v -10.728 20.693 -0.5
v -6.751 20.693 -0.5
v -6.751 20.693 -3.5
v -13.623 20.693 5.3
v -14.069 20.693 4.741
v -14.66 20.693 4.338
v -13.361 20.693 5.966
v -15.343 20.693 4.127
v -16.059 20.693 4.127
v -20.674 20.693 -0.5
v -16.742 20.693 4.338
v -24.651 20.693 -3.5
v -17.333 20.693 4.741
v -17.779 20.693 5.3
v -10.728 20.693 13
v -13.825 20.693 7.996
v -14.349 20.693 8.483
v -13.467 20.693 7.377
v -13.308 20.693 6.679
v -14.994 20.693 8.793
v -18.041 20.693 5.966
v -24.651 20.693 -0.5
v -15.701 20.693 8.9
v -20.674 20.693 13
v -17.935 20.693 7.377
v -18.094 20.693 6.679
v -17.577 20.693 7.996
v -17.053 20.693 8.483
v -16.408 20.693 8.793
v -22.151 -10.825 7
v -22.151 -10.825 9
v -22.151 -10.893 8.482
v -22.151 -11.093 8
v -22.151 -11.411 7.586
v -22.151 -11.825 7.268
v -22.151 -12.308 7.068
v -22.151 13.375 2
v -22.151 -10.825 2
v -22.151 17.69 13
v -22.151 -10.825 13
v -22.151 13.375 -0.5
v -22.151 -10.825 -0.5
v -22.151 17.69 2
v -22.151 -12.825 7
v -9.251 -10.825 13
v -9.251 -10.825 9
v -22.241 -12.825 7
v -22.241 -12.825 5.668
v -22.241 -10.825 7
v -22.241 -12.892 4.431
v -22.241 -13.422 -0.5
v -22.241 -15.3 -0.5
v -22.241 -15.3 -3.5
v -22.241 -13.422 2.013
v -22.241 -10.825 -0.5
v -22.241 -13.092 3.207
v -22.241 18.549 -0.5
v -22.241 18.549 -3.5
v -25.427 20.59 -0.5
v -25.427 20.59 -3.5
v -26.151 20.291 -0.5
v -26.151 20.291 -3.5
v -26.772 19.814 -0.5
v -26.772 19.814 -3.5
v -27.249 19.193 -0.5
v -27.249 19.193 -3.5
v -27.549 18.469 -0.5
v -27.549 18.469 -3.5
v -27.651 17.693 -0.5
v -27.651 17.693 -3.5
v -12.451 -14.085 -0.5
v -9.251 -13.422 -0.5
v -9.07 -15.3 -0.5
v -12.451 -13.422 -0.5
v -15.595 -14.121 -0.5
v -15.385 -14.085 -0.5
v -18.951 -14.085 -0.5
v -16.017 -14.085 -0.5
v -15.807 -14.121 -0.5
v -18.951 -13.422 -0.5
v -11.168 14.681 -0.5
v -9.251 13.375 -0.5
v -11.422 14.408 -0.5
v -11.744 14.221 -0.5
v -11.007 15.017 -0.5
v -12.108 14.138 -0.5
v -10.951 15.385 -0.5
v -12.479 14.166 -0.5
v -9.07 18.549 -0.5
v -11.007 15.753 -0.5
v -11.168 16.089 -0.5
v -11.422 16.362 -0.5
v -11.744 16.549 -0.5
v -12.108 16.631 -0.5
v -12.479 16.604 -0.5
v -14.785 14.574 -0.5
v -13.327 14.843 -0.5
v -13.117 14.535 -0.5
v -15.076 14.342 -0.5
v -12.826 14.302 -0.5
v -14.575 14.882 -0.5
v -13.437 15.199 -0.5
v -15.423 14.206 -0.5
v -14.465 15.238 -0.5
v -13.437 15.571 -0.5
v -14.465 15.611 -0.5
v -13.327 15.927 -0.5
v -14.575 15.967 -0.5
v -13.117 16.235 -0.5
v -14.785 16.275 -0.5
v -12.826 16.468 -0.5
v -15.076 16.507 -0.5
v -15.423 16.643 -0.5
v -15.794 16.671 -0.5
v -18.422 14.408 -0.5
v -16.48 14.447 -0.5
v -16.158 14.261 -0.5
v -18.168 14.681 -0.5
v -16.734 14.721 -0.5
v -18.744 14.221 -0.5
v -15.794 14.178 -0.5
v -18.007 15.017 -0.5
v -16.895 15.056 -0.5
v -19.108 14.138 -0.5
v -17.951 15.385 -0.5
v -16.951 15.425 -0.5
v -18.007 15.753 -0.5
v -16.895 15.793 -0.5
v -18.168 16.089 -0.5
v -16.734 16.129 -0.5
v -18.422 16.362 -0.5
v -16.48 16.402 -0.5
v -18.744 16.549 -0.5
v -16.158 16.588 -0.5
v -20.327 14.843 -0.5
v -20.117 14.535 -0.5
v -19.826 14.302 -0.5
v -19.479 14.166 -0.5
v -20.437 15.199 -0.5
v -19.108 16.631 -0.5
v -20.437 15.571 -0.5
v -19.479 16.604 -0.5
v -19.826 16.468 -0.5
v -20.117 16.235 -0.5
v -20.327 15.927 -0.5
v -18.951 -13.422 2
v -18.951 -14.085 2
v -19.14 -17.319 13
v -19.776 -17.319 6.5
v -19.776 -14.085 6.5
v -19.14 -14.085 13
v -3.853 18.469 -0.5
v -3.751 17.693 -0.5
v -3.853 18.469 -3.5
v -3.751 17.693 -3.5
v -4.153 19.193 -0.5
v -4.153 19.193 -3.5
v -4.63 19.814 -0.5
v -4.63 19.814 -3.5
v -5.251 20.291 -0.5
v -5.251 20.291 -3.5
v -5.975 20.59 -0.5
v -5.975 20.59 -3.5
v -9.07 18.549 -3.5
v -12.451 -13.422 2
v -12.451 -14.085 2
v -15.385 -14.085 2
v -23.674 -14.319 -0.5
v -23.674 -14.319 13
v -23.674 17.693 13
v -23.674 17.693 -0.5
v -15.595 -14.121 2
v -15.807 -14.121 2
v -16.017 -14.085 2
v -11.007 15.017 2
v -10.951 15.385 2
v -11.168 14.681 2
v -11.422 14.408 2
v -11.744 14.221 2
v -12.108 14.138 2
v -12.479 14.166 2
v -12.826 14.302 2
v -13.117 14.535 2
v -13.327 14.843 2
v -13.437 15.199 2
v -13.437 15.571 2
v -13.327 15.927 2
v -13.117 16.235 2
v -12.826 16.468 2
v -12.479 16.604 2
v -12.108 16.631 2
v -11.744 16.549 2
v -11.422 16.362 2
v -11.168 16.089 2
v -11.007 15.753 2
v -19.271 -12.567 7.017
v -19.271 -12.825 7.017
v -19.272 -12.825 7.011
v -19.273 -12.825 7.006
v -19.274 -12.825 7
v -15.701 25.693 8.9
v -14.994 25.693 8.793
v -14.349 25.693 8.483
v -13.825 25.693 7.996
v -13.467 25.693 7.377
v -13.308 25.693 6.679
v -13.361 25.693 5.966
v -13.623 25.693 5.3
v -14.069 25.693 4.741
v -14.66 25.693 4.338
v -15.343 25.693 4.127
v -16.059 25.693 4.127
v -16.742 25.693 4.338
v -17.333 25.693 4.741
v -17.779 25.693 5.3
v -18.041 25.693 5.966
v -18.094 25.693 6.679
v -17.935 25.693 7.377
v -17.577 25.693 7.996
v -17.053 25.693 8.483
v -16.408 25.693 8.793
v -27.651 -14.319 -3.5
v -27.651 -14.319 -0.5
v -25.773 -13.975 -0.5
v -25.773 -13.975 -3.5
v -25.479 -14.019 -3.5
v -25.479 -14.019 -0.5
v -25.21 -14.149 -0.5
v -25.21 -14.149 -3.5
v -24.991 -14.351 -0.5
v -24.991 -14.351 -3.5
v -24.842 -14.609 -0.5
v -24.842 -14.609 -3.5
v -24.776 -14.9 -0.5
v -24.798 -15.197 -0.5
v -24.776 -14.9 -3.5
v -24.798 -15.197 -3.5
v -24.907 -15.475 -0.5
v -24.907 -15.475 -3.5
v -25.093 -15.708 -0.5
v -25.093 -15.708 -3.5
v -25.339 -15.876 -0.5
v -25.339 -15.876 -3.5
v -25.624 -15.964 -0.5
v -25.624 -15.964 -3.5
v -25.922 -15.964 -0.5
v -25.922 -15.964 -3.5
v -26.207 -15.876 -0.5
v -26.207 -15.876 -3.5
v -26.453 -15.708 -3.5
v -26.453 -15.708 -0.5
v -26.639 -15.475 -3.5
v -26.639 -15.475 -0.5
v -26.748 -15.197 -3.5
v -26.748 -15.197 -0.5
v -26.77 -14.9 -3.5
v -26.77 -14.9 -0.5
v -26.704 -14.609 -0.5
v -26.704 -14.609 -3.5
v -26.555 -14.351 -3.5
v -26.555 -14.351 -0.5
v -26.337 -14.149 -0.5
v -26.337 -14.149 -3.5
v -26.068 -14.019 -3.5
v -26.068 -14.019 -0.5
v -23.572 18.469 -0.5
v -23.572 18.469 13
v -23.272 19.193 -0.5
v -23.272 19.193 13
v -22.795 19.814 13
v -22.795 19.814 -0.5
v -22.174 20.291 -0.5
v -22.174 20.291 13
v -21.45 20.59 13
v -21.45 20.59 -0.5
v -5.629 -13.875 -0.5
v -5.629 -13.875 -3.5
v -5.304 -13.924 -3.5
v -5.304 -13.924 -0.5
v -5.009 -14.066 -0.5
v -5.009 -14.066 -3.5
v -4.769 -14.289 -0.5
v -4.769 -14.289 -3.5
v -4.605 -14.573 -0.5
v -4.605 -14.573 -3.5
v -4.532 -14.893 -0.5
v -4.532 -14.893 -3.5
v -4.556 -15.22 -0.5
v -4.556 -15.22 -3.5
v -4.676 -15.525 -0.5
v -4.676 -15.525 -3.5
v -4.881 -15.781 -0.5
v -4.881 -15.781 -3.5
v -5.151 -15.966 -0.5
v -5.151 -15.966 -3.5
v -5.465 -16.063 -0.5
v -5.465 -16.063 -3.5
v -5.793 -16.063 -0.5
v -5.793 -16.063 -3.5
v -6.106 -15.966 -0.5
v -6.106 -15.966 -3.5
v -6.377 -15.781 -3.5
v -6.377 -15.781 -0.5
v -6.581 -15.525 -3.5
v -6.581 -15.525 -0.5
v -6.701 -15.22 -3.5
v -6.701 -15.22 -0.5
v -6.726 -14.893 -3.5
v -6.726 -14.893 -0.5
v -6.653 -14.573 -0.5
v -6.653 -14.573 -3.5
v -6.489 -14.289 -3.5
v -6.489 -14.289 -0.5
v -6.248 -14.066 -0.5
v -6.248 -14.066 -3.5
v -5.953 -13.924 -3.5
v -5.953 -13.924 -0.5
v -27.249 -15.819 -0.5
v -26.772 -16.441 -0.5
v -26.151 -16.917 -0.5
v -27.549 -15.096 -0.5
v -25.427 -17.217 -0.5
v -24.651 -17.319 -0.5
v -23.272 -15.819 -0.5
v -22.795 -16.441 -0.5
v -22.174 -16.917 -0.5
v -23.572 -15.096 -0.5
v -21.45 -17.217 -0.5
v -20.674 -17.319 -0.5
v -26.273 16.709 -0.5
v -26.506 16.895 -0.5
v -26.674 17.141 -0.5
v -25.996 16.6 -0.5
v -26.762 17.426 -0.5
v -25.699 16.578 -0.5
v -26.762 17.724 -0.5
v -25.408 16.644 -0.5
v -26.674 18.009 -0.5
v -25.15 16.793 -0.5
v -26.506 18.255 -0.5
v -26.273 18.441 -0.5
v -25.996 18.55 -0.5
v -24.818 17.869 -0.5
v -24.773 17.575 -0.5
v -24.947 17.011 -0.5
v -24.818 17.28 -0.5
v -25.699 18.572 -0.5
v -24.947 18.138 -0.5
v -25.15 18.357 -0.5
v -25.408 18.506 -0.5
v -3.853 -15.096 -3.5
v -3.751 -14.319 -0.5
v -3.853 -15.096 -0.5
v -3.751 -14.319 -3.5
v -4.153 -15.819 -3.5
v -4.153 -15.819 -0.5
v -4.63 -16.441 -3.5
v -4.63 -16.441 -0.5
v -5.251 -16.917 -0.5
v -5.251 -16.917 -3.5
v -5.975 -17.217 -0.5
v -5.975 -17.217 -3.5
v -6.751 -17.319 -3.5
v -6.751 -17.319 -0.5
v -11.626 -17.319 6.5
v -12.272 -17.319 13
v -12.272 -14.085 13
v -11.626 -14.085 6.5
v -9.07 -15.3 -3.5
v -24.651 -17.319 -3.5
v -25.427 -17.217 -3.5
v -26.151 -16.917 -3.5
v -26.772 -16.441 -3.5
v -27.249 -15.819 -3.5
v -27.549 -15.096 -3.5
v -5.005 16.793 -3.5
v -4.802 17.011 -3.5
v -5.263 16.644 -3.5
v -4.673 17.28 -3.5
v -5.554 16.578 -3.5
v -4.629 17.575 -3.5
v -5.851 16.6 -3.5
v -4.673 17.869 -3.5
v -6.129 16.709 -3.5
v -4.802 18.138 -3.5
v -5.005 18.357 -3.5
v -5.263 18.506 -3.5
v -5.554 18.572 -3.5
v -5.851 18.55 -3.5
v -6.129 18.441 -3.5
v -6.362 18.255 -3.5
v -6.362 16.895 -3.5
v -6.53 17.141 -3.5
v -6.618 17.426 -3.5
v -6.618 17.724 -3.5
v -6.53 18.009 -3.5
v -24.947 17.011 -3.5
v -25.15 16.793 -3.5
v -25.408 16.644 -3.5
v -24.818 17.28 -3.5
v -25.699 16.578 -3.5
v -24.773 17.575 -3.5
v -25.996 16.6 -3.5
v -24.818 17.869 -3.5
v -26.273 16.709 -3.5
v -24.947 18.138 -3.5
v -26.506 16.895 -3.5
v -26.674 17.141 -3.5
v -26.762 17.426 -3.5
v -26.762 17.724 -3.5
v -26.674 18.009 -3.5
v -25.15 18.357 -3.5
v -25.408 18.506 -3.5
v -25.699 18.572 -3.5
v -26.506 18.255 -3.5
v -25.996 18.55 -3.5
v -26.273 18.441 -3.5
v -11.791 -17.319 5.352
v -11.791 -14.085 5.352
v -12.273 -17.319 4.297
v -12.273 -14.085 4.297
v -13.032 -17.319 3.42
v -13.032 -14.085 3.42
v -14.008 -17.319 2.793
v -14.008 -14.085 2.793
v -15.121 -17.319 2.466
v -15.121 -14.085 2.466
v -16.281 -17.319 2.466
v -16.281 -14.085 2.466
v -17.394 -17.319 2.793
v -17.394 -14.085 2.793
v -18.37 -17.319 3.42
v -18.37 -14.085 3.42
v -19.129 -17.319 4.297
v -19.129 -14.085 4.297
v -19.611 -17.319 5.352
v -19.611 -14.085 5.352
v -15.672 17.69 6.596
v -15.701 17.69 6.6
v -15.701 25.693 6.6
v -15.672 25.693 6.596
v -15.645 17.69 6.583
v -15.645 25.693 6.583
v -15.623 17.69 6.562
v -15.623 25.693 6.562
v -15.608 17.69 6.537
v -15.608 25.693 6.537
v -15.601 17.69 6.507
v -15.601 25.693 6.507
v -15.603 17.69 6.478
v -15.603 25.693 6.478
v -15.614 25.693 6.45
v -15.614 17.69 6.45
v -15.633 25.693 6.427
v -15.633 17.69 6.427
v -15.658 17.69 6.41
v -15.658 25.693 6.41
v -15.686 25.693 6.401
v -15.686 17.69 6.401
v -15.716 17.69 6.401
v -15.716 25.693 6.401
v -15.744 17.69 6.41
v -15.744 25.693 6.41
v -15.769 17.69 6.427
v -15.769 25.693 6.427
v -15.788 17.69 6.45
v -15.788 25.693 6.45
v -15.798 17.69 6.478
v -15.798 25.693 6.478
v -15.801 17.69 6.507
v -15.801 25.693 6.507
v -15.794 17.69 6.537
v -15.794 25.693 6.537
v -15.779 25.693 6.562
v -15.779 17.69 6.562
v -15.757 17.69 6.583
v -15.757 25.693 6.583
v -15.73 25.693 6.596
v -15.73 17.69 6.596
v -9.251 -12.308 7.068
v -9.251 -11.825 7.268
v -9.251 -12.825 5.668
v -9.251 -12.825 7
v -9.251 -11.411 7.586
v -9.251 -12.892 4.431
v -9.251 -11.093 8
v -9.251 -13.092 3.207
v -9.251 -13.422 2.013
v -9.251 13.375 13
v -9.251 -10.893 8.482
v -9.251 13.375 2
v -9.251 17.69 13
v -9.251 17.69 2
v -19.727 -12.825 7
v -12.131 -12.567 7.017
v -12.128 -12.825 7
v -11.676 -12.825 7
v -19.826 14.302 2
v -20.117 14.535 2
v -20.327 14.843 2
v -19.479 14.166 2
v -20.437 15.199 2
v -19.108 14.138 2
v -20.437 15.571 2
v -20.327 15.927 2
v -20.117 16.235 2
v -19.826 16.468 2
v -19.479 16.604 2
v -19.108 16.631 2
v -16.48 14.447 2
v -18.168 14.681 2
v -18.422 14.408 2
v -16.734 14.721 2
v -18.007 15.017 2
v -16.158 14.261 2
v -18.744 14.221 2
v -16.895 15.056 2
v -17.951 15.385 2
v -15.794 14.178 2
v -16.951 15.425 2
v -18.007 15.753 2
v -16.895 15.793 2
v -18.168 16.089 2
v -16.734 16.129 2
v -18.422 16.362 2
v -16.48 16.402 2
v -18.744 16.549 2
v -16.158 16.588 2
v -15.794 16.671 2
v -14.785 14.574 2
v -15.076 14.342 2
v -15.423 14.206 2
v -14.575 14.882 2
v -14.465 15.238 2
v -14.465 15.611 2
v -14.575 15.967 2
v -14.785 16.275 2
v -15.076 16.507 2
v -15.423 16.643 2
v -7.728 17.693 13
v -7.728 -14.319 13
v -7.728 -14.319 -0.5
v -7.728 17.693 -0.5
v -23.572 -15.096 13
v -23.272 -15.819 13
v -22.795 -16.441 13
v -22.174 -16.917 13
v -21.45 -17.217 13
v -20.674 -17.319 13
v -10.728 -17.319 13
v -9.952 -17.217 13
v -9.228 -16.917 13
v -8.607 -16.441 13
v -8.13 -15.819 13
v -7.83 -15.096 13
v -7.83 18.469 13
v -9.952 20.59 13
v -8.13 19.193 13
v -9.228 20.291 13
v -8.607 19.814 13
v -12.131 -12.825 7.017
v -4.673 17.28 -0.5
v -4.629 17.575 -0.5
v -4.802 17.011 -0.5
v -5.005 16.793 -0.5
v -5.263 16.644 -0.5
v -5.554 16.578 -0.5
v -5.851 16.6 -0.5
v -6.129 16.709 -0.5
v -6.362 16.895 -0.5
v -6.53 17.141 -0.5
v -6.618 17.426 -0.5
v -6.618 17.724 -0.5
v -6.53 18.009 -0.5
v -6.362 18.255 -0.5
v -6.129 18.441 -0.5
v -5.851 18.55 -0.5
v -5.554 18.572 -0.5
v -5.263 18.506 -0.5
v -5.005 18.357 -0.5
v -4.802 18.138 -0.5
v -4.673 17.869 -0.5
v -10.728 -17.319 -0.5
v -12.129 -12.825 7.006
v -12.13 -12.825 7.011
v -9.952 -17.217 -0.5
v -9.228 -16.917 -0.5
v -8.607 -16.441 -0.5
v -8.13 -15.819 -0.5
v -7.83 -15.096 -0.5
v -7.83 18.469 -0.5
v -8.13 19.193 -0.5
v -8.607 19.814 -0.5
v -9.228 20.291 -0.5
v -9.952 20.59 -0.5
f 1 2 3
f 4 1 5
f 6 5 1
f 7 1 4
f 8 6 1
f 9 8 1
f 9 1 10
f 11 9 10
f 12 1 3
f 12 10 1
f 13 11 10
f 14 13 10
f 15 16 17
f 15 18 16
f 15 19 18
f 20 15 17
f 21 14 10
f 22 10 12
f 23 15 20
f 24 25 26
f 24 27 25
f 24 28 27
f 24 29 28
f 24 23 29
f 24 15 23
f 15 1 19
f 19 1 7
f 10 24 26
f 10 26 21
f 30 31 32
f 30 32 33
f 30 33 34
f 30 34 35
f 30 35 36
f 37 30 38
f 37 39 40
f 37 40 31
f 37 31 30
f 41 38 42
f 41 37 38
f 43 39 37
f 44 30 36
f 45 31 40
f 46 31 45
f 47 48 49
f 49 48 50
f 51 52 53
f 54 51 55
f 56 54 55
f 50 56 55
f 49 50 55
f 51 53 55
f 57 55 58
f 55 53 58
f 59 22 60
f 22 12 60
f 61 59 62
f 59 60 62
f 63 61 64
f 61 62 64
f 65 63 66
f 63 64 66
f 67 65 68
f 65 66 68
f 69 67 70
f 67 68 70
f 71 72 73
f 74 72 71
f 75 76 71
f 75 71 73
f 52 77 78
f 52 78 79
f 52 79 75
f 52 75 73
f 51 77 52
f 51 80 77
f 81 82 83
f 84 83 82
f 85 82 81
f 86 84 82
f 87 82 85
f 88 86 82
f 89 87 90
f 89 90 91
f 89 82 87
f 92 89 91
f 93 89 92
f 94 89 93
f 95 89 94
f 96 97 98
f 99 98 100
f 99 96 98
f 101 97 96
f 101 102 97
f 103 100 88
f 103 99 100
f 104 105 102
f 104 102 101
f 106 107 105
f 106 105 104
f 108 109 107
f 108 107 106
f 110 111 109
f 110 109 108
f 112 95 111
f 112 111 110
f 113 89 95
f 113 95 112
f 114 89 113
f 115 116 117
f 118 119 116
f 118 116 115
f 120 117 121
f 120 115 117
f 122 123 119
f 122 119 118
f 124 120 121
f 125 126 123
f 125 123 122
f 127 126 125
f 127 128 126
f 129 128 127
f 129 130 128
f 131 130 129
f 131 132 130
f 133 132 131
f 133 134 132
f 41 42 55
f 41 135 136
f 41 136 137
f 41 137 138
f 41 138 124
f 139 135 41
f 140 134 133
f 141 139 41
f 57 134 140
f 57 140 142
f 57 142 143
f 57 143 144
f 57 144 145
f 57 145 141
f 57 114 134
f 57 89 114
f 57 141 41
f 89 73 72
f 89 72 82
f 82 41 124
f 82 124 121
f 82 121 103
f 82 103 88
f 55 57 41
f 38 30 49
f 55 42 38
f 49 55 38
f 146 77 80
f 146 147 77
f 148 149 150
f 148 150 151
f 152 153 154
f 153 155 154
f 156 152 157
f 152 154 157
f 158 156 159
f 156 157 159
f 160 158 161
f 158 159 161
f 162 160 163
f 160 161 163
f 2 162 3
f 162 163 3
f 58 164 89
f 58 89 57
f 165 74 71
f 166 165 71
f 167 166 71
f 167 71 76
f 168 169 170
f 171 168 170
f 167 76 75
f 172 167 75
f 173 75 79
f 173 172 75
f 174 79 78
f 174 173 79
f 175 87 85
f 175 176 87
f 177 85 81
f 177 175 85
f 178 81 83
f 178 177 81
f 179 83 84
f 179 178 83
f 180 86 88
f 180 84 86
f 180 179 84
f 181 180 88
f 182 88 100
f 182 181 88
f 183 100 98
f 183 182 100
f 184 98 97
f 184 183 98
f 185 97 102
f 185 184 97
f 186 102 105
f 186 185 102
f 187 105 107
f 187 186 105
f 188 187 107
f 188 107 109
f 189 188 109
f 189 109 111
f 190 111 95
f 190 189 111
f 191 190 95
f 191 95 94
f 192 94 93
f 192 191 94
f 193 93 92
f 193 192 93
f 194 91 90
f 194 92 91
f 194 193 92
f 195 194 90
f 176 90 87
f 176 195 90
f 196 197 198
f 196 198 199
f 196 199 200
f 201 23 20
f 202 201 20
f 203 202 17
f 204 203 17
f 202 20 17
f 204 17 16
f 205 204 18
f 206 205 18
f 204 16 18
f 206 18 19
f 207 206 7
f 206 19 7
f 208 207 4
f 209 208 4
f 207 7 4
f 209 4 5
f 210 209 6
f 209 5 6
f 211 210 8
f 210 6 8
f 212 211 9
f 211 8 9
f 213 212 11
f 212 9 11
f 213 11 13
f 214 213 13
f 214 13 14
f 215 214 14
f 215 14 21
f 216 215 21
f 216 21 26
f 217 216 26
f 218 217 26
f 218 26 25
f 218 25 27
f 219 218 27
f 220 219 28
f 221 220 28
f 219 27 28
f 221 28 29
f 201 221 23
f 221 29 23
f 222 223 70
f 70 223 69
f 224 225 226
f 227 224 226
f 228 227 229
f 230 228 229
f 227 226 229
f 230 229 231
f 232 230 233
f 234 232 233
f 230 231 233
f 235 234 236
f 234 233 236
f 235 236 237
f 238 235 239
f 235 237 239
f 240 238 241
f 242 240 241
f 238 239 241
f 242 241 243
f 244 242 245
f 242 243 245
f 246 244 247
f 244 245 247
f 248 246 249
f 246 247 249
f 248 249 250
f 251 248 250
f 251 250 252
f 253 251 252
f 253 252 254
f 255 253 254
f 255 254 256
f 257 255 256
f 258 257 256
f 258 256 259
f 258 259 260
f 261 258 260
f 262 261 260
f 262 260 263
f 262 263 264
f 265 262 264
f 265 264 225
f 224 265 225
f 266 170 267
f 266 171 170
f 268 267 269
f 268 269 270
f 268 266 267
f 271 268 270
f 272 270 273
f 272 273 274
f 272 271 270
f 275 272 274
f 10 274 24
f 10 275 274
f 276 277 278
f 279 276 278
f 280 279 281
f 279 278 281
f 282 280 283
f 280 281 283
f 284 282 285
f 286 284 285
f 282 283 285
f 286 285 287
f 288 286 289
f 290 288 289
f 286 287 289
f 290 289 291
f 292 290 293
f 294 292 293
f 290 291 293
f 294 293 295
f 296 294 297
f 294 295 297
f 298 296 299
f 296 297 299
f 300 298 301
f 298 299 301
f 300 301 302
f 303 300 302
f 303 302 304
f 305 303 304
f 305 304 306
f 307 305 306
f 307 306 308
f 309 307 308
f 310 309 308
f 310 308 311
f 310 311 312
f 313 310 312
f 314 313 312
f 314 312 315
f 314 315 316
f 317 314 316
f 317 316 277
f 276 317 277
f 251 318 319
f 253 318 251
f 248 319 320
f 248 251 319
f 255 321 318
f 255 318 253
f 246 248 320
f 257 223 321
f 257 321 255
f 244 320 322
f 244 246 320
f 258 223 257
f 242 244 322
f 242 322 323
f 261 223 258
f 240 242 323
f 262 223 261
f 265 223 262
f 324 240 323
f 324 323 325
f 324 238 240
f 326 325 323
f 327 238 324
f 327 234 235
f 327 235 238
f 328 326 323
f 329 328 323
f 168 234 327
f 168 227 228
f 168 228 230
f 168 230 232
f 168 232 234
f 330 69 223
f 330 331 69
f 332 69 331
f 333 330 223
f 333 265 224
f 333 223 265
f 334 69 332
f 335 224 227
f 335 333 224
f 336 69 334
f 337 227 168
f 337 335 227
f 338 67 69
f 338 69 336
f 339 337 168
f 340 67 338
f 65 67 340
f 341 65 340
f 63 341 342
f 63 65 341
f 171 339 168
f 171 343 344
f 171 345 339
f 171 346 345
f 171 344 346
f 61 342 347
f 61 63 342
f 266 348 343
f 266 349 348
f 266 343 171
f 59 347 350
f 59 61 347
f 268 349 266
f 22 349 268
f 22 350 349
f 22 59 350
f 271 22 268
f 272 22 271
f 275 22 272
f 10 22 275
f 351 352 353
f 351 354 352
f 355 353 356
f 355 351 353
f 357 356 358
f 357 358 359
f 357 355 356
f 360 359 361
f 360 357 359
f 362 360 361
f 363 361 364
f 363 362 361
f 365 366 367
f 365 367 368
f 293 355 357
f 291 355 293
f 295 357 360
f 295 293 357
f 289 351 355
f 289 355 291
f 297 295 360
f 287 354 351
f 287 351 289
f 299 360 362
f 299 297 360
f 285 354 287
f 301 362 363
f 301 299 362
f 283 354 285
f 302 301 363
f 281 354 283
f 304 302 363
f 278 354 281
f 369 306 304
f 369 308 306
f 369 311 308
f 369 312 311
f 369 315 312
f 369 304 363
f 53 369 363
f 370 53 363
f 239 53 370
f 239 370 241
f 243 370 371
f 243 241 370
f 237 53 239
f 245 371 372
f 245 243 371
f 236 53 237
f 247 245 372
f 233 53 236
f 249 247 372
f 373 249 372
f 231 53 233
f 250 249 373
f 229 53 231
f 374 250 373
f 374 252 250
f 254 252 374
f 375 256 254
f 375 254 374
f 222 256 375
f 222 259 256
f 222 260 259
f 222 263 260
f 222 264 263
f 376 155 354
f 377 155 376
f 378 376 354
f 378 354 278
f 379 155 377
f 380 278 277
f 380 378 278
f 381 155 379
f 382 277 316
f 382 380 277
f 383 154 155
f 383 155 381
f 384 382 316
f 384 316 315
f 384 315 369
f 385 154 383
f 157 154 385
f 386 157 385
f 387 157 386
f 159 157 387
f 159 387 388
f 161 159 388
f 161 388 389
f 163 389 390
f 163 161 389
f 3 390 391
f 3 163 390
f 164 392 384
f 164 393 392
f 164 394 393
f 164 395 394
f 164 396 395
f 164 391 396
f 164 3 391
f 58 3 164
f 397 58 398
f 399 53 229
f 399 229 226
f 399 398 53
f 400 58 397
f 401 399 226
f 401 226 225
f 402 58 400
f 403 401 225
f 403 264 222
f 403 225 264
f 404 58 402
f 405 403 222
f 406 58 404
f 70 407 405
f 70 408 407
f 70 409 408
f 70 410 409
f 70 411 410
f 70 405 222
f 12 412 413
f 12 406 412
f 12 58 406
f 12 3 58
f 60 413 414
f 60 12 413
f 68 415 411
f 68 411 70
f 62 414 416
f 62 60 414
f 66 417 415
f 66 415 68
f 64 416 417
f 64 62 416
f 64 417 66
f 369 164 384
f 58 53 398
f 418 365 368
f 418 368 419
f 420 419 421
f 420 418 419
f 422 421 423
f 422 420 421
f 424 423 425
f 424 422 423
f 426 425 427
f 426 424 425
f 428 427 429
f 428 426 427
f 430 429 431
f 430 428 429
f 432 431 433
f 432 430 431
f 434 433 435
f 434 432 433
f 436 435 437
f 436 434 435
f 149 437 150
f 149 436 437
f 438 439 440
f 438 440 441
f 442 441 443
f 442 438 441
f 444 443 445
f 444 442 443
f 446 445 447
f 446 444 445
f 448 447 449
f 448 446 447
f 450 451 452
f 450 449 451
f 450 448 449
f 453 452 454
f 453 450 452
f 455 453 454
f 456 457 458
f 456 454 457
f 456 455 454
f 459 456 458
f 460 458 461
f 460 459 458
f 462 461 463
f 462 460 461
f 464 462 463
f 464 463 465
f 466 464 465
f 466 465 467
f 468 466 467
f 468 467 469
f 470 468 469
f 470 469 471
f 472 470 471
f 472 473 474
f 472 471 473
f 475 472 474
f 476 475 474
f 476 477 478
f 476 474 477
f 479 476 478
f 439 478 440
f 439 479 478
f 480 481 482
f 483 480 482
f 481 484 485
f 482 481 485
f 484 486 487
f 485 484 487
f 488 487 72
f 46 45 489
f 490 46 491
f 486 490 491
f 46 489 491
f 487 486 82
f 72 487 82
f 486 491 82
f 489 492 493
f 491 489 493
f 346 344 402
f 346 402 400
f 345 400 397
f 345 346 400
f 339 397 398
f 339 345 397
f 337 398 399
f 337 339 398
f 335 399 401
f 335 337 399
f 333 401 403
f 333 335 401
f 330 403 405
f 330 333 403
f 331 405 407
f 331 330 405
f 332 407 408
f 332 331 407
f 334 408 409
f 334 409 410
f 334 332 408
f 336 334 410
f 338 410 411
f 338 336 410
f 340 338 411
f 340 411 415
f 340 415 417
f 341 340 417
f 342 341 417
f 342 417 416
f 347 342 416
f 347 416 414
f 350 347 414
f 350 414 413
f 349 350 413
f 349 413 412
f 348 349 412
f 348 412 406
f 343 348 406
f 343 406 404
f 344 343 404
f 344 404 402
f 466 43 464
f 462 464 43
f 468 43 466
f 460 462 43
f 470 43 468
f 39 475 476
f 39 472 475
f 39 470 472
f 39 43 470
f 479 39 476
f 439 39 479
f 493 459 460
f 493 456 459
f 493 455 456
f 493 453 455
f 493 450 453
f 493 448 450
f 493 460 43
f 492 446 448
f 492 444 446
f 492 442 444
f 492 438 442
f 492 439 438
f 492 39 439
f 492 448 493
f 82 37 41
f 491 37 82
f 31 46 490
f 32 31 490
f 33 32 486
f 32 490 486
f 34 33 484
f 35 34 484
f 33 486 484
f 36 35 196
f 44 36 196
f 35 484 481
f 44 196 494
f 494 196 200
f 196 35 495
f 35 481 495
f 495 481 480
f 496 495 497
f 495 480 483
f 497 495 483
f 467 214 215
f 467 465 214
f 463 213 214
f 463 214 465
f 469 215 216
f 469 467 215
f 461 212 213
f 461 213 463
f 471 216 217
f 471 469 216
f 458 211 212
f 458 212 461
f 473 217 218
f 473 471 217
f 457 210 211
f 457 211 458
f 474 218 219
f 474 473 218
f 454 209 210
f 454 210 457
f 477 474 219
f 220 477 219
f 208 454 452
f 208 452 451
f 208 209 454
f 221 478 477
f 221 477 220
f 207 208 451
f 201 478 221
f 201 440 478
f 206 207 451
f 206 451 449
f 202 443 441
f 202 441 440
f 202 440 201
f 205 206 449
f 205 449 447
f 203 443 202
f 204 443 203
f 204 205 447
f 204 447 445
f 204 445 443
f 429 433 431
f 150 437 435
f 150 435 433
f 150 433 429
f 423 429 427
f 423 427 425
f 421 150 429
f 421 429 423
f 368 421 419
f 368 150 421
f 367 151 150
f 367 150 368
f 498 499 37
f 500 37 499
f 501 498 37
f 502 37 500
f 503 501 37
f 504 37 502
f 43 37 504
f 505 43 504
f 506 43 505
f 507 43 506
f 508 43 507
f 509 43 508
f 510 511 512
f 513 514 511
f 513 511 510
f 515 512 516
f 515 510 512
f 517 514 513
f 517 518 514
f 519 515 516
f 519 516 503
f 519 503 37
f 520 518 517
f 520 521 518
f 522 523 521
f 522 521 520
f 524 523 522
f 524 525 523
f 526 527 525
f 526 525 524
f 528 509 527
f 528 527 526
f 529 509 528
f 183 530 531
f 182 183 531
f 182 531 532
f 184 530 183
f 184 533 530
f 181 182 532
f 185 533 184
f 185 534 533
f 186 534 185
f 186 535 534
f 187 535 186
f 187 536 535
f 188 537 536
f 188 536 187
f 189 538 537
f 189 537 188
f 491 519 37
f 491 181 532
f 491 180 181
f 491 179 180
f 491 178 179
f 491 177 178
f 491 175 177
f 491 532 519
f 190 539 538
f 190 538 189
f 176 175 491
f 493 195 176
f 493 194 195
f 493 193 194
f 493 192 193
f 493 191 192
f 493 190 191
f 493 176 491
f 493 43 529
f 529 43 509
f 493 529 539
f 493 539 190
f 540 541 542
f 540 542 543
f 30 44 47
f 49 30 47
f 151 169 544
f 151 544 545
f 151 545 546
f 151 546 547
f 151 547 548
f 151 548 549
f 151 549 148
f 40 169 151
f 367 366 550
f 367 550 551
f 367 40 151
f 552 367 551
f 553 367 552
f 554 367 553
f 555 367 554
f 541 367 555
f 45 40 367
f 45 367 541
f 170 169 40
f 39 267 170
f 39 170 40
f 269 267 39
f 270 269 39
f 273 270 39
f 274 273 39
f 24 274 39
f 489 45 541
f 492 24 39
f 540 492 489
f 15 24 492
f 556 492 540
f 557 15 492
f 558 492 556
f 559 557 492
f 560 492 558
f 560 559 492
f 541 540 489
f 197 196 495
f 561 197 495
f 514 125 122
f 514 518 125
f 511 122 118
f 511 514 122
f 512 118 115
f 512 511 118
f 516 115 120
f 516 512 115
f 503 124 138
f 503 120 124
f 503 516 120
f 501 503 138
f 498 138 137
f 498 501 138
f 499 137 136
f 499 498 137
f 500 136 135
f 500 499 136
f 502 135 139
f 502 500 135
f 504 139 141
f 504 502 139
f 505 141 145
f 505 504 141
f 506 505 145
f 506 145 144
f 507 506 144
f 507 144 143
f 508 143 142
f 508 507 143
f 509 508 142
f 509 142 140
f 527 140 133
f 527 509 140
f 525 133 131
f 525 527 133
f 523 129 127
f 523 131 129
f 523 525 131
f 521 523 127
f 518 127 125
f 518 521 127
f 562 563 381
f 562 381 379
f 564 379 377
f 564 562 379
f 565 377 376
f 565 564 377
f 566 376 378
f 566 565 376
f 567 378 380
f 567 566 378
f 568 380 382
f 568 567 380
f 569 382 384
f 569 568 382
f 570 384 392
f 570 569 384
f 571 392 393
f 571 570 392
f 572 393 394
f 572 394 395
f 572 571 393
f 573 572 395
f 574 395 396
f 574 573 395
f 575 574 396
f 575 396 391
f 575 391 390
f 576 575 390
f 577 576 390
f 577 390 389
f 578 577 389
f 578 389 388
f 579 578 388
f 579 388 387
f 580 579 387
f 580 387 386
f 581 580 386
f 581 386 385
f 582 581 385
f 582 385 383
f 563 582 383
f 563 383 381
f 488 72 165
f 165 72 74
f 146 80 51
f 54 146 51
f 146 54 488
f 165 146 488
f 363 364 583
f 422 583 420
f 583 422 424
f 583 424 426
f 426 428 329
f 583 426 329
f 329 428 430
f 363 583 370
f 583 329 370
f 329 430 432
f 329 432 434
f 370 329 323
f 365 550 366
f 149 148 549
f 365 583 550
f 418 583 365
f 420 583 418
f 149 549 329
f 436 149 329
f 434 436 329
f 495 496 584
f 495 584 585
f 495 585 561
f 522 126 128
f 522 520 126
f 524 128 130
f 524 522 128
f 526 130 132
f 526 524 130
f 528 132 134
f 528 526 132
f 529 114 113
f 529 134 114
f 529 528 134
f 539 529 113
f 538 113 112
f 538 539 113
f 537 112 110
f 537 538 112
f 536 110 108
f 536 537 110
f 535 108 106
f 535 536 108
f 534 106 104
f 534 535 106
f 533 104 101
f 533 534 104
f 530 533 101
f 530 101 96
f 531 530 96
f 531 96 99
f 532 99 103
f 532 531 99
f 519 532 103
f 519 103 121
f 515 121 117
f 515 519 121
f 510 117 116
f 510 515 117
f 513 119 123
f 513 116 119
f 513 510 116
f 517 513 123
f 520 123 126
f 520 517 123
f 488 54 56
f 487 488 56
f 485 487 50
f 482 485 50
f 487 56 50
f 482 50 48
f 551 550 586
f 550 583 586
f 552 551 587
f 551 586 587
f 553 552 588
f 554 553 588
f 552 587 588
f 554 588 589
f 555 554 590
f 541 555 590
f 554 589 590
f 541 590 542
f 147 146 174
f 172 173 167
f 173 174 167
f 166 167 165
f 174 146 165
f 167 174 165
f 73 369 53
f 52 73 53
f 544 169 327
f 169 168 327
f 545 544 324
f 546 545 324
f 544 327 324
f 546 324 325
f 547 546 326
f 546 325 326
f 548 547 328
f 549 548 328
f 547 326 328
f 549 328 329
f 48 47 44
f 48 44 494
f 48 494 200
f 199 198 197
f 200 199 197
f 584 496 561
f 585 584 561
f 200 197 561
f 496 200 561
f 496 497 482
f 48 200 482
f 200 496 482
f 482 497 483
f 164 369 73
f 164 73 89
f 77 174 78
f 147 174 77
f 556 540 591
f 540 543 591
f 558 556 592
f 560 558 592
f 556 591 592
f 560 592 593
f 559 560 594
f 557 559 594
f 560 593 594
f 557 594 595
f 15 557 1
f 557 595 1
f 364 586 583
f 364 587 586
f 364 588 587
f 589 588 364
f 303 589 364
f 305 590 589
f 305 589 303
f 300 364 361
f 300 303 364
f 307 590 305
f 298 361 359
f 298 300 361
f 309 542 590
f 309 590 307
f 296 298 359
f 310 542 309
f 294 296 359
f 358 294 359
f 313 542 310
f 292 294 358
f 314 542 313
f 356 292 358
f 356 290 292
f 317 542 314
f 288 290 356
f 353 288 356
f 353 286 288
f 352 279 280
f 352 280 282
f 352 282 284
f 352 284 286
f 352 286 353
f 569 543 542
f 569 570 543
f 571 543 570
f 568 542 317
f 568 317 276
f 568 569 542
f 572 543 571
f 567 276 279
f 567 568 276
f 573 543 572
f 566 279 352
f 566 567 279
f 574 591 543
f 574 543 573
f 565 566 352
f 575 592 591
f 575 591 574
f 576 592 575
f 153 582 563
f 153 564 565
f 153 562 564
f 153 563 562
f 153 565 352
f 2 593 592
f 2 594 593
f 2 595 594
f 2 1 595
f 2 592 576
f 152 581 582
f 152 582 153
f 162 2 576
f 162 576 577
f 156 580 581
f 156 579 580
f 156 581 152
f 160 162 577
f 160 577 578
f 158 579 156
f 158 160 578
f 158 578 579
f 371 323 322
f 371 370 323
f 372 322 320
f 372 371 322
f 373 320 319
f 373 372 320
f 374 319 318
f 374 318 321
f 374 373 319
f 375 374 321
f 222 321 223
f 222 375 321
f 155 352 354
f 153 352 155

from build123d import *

# Parameters (mm, degrees)
SKETCH_1_W                = 32.6
SKETCH_1_H                = 34.6
SKETCH_1_R                = 1.25
SKETCH_1_W_2              = 24.6
SKETCH_1_H_2              = 24.2
EXTRUDE_1_DEPTH           = 13
SKETCH_3_W                = 6.5
SKETCH_3_H                = 6.519005167
CUT_EXTRUDE_1_DEPTH       = 19
SKETCH_4_W                = 6.5
SKETCH_4_H                = 6.467668889
CUT_EXTRUDE_2_DEPTH       = 23
EXTRUDE_2_DEPTH           = 50
SKETCH_1_2_W              = 22.27659965
SKETCH_1_2_H              = 4.598586669
SKETCH_1_2_W_2            = 22.283050596
SKETCH_1_2_H_2            = 4.977540741
CUT_EXTRUDE_5_DEPTH       = 34
FILLET_1_R                = 2
FILLET_2_R                = 2
SKETCH_9_W                = 54.594998093
SKETCH_9_H                = 18.111982385
SKETCH_9_W_2              = 52.534809486
SKETCH_9_H_2              = 12.989301534
CUT_EXTRUDE_6_DEPTH       = 41
FILLET_6_R                = 22
EXTRUDE_4_DEPTH           = 13
SKETCH_13_W               = 5.518907879
SKETCH_13_H               = 8.361822047
CUT_EXTRUDE_8_DEPTH       = 8.5
SKETCH_14_W               = 6.038657432
SKETCH_14_H               = 7.741248121
CUT_EXTRUDE_9_DEPTH       = 8.5
SKETCH_23_OUTSIDE_W       = 35.102
SKETCH_23_OUTSIDE_H       = 56.702
SKETCH_23_OUTSIDE_W_2     = 1.5
SKETCH_23_OUTSIDE_H_2     = 34.6
CUT_EXTRUDE_10_DEPTH      = 104
SKETCH_24_W               = 10.341780897
SKETCH_24_H               = 5.2
SKETCH_24_R               = 1.25
EXTRUDE_5_DEPTH           = 1.5
SKETCH_25_R               = 1.25
CUT_EXTRUDE_11_DEPTH      = 104
SKETCH_26_OUTSIDE_W       = 115.402
SKETCH_26_OUTSIDE_H       = 56.536
SKETCH_26_OUTSIDE_W_2     = 17.268409177
SKETCH_26_OUTSIDE_H_2     = 34.6
CUT_EXTRUDE_12_DEPTH      = 10
SKETCH_27_W               = 2.368409177
SKETCH_27_H               = 25.781356428
EXTRUDE_6_DEPTH           = 1.5
SKETCH_28_R               = 1.25
CUT_EXTRUDE_13_DEPTH      = 10
CUT_EXTRUDE_START         = -1.5
CUT_EXTRUDE_14_OUTLINE_W  = 0.368409177
CUT_EXTRUDE_14_OUTLINE_H  = 34.6
CUT_EXTRUDE_14_DEPTH      = 1.5
SKETCH_30_R               = 1.1
SKETCH_30_R_2             = 1
SKETCH_30_W               = 15.411127821
SKETCH_30_H               = 34.6
EXTRUDE_7_DEPTH           = 1.5
SKETCH_33_W               = 23.9
SKETCH_33_H               = 38.011921137
SKETCH_33_R               = 1.25
SKETCH_33_R_2             = 1
EXTRUDE_8_DEPTH           = 15
SKETCH_34_OUTSIDE_W       = 35.468
SKETCH_34_OUTSIDE_H       = 49.58
SKETCH_34_OUTSIDE_W_2     = 15.945908464
SKETCH_34_OUTSIDE_H_2     = 43.183358486
CUT_EXTRUDE_15_DEPTH      = 13.5
SKETCH_35_W               = 12.9
SKETCH_35_H               = 31.784162084
CUT_EXTRUDE_16_DEPTH      = 11
SKETCH_37_R               = 2.4
EXTRUDE_9_DEPTH           = 5
SKETCH_39_W               = 13.171271292
SKETCH_39_H               = 33.849019387
CUT_EXTRUDE_17_DEPTH      = 3
FILLET_7_R                = 3
CUT_EXTRUDE_18_DEPTH      = 53.759852886
CUT_EXTRUDE_18_DEPTH_BACK = 53.759852886
SKETCH_40_R               = 0.1
SKETCH_42_W               = 13.648654979
SKETCH_42_H               = 4.665334349
EXTRUDE_10_DEPTH          = 11
CUT_EXTRUDE_19_DEPTH      = 4.493948053
SKETCH_43_R               = 3.607554058
CUT_EXTRUDE_20_DEPTH      = 1
SKETCH_44_W               = 12.990377478
SKETCH_44_H               = 2.596310078
CUT_EXTRUDE_21_DEPTH      = 7.5
SKETCH_46_W               = 13.018615597
SKETCH_46_H               = 10.987054625
EXTRUDE_11_DEPTH          = 1.259502583
SKETCH_48_W               = 7.320827495
SKETCH_48_H               = 3.139430645
EXTRUDE_12_DEPTH          = 1
FILLET_9_R                = 11.5
FILLET_11_R               = 2
FILLET_12_R               = 3
SKETCH_49_R               = 1.1
SKETCH_49_R_2             = 1
CUT_EXTRUDE_22_DEPTH      = 42.193941463


# Read off the part's stored shape, not the designer's step: 切除-拉伸14
with BuildPart() as part:
    # Sketch 1 → 凸台-拉伸1 (new body)
    with BuildSketch(Plane.XY):
        with Locations((-9.850980392, 1.274712581)):
            Rectangle(SKETCH_1_W, SKETCH_1_H)
        with Locations(Location((-15.700980392, 15.424712581, 0), (0, 0, 180))):
            Circle(SKETCH_1_R, mode=Mode.SUBTRACT)
        with Locations(Location((-3.600980392, 15.424712581, 0), (0, 0, 180))):
            Circle(SKETCH_1_R, mode=Mode.SUBTRACT)
        with Locations(Location((-15.700980392, -12.875287419, 0), (0, 0, 180))):
            Circle(SKETCH_1_R, mode=Mode.SUBTRACT)
        with Locations(Location((-3.600980392, -12.875287419, 0), (0, 0, 180))):
            Circle(SKETCH_1_R, mode=Mode.SUBTRACT)
        with Locations((-9.850980392, 1.274712581)):
            Rectangle(SKETCH_1_W_2, SKETCH_1_H_2, mode=Mode.SUBTRACT)
    extrude(amount=EXTRUDE_1_DEPTH)

    # 草图3 → 切除-拉伸1 (cut)
    with BuildSketch(Plane(origin=(0, 0, 0), x_dir=(-1, 0, 0), z_dir=(0, 0, -1))):
        with Locations((15.700980392, -10.82528742)):
            Rectangle(SKETCH_3_W, SKETCH_3_H)
    extrude(amount=-CUT_EXTRUDE_1_DEPTH, mode=Mode.SUBTRACT)

    # 草图4 → 切除-拉伸2 (cut)
    with BuildSketch(Plane.XY.offset(13)):
        with Locations((-3.600980392, -10.82528742)):
            Rectangle(SKETCH_4_W, SKETCH_4_H)
    extrude(amount=-CUT_EXTRUDE_2_DEPTH, mode=Mode.SUBTRACT)

    # 草图5 → 凸台-拉伸2 (add)
    with BuildSketch(Plane(origin=(6.449019608, 0, 0), x_dir=(0, 0, -1), z_dir=(1, 0, 0))):
        Polygon((-13, 18.574712581), (-13, 10.055461473), (-13, -16.025287419), (0, -16.025287419), (0, -15.027567927), (0, 16.282461831), (0, 18.574712581), align=None)
    extrude(amount=EXTRUDE_2_DEPTH)

    # Sketch 1 2 → 切除-拉伸5 (cut)
    with BuildSketch(Plane.XY.offset(13)):
        with Locations((24.037173058, -7.263594431)):
            Rectangle(SKETCH_1_2_W, SKETCH_1_2_H)
        with Locations((24.078382453, 0.81654228)):
            Rectangle(SKETCH_1_2_W_2, SKETCH_1_2_H_2)
    extrude(amount=-CUT_EXTRUDE_5_DEPTH, mode=Mode.SUBTRACT)

    # 圆角1
    fillet_1_edges = [part.edges().sort_by_distance(p)[0] for p in [
        (12.936857155, -1.672228091, 6.5),
        (12.936857155, 3.30531265, 6.5),
        (35.219907751, 3.30531265, 6.5),
        (35.219907751, -1.672228091, 6.5),
        (12.898873233, -9.562887765, 6.5),
        (12.898873233, -4.964301096, 6.5),
        (35.175472883, -4.964301096, 6.5),
        (35.175472883, -9.562887765, 6.5),
    ]]
    fillet(fillet_1_edges, radius=FILLET_1_R)

    # 圆角2
    fillet_2_edges = [part.edges().sort_by_distance(p)[0] for p in [
        (-26.150980392, -16.025287419, 6.5),
        (-26.150980392, 18.574712581, 6.5),
    ]]
    fillet(fillet_2_edges, radius=FILLET_2_R)

    # 草图9 → 切除-拉伸6 (cut)
    with BuildSketch(Plane(origin=(0, 0, 0), x_dir=(-1, 0, 0), z_dir=(0, 0, -1))):
        with Locations((-36.934177516, 16.051357777)):
            Rectangle(SKETCH_9_W, SKETCH_9_H)
        with Locations((-36.653242706, -19.247200889)):
            Rectangle(SKETCH_9_W_2, SKETCH_9_H_2)
    extrude(amount=-CUT_EXTRUDE_6_DEPTH, mode=Mode.SUBTRACT)

    # 圆角6
    # the kernel refuses this fillet: 22 mm, written as the material it adds along each edge
    with BuildSketch(Plane(origin=(9.636678469, 6.995366584, 0), x_dir=(0, 1, 0), z_dir=(0, 0, 1))) as fillet_6_piece_1:
        with BuildLine():
            CenterArc((22, -19.375499223), FILLET_6_R, 118.272534833, 61.727465167)
            Line((0, -19.375499223), (-0.44, -19.375499223))
            Line((-0.44, -19.375499223), (-0.44, 0))
            Line((-0.44, 0), (0, 0.44))
            ThreePointArc((0, 0.44), (5.789672998, 0.44), (11.370932916, 0.387509984))
            Line((11.370932916, 0.387509984), (11.579345996, 0))
        make_face()
    extrude(amount=13)
    with BuildSketch(Plane(origin=(10.385837963, -12.752550122, 0), x_dir=(1, 0, 0), z_dir=(0, 0, 1))) as fillet_6_piece_2:
        with BuildLine():
            CenterArc((11.54511289, -22), FILLET_6_R, 90, 31.653290012)
            Line((0, -3.272737297), (-0.230902258, -2.898192043))
            ThreePointArc((-0.230902258, -2.898192043), (-0.44, -1.636368649), (-0.44, 0))
            Line((-0.44, 0), (0, 0.44))
            Line((0, 0.44), (11.54511289, 0.44))
            Line((11.54511289, 0.44), (11.54511289, 0))
        make_face()
    extrude(amount=13)

    # 草图12 → 凸台-拉伸4 (add)
    with BuildSketch(Plane(origin=(0, 0, 0), x_dir=(-1, 0, 0), z_dir=(0, 0, -1))):
        with BuildLine():
            Line((24.150980392, 18.574712581), (24.496655084, -15.99518818))
            ThreePointArc((24.496655084, -15.99518818), (37.015647173, 1.416671567), (24.150980392, 18.574712581))
        make_face()
        with BuildLine():
            Line((26.822698684, 1.289948959), (26.822698684, -8.431688638))
            ThreePointArc((26.822698684, -8.431688638), (32.027920461, 1.289948959), (26.822698684, 11.011586556))
            Line((26.822698684, 11.011586556), (26.822698684, 1.289948959))
        make_face(mode=Mode.SUBTRACT)
    extrude(amount=-EXTRUDE_4_DEPTH)

    # 草图13 → 切除-拉伸8 (cut)
    with BuildSketch(Plane.XY.offset(13)):
        with Locations((-3.600980393, 15.424712581)):
            Rectangle(SKETCH_13_W, SKETCH_13_H)
    extrude(amount=-CUT_EXTRUDE_8_DEPTH, mode=Mode.SUBTRACT)

    # 草图14 → 切除-拉伸9 (cut)
    with BuildSketch(Plane(origin=(0, 0, 0), x_dir=(-1, 0, 0), z_dir=(0, 0, -1))):
        with Locations((15.700980392, 15.424712581)):
            Rectangle(SKETCH_14_W, SKETCH_14_H)
    extrude(amount=-CUT_EXTRUDE_9_DEPTH, mode=Mode.SUBTRACT)

    # 草图23 outside → 切除-拉伸10 (cut)
    with BuildSketch(Plane(origin=(56.449019608, 0, 0), x_dir=(0, 0, -1), z_dir=(1, 0, 0))):
        with Locations((-6.5, 1.275)):
            Rectangle(SKETCH_23_OUTSIDE_W, SKETCH_23_OUTSIDE_H)
        with Locations((-12.25, 1.274712581)):
            Rectangle(SKETCH_23_OUTSIDE_W_2, SKETCH_23_OUTSIDE_H_2, mode=Mode.SUBTRACT)
    extrude(amount=-CUT_EXTRUDE_10_DEPTH, mode=Mode.SUBTRACT)

    # 草图24 → 凸台-拉伸5 (add)
    with BuildSketch(Plane.XY.offset(13)):
        with Locations((-4.17557206, 15.974712581)):
            Rectangle(SKETCH_24_W, SKETCH_24_H)
        with Locations((-3.600980392, 15.429779286)):
            Circle(SKETCH_24_R, mode=Mode.SUBTRACT)
    extrude(amount=-EXTRUDE_5_DEPTH)

    # 草图25 → 切除-拉伸11 (cut)
    with BuildSketch(Plane.XY.offset(13)):
        with Locations((42.624971711, -3.793205976)):
            Circle(SKETCH_25_R)
        with Locations((-34.434765713, 1.289948959)):
            Circle(SKETCH_25_R)
        with Locations((-25.484048207, 14.316394652)):
            Circle(SKETCH_25_R)
        with Locations((-25.484048207, -12.050711449)):
            Circle(SKETCH_25_R)
    extrude(amount=-CUT_EXTRUDE_11_DEPTH, mode=Mode.SUBTRACT)

    # 草图26 outside → 切除-拉伸12 (cut)
    with BuildSketch(Plane.XY.offset(13)):
        with Locations((9.716, 1.275)):
            Rectangle(SKETCH_26_OUTSIDE_W, SKETCH_26_OUTSIDE_H)
        with Locations((-15.516775803, 1.274712581)):
            Rectangle(SKETCH_26_OUTSIDE_W_2, SKETCH_26_OUTSIDE_H_2, mode=Mode.SUBTRACT)
    extrude(amount=-CUT_EXTRUDE_12_DEPTH, mode=Mode.SUBTRACT)

    # 草图27 → 凸台-拉伸6 (add)
    with BuildSketch(Plane.XY.offset(13)):
        with Locations((-8.066775804, 0.484034367)):
            Rectangle(SKETCH_27_W, SKETCH_27_H)
    extrude(amount=-EXTRUDE_6_DEPTH)

    # 草图28 → 切除-拉伸13 (cut)
    with BuildSketch(Plane.XY.offset(13)):
        with Locations((-19.200980392, 15.384992379)):
            Circle(SKETCH_28_R)
        with Locations((-12.200980392, 15.384992379)):
            Circle(SKETCH_28_R)
    extrude(amount=-CUT_EXTRUDE_13_DEPTH, mode=Mode.SUBTRACT)

    # 切除-拉伸14 outline → 切除-拉伸14 (cut)
    with BuildSketch(Plane.XY.offset(13).offset(CUT_EXTRUDE_START)):
        with Locations((-7.066775804, 1.274712581)):
            Rectangle(CUT_EXTRUDE_14_OUTLINE_W, CUT_EXTRUDE_14_OUTLINE_H)
    extrude(amount=CUT_EXTRUDE_14_DEPTH, mode=Mode.SUBTRACT)

    # 草图30 → 凸台-拉伸7 (add)
    with BuildSketch(Plane.XY.offset(13)):
        Polygon((-27.650980392, 18.574712581), (-27.650980392, -16.025287419), (-27.650980392, -17.319235473), (-3.750980392, -17.319235473), (-3.750980392, -16.025287419), (-3.750980392, 18.574712581), (-3.750980392, 20.692685664), (-27.650980392, 20.692685664), align=None)
        with Locations((-25.773264037, -15.025287419)):
            Circle(SKETCH_30_R, mode=Mode.SUBTRACT)
        with Locations((-25.773264037, 17.574712581)):
            Circle(SKETCH_30_R_2, mode=Mode.SUBTRACT)
        with Locations((-5.628696747, 17.574712581)):
            Circle(SKETCH_30_R_2, mode=Mode.SUBTRACT)
        with Locations((-5.628696747, -15.025287419)):
            Circle(SKETCH_30_R, mode=Mode.SUBTRACT)
        with Locations((-15.213421192, 1.274712581)):
            Rectangle(SKETCH_30_W, SKETCH_30_H, mode=Mode.SUBTRACT)
    extrude(amount=-EXTRUDE_7_DEPTH)

    # 草图33 → 凸台-拉伸8 (add)
    with BuildSketch(Plane(origin=(0, 0, 11.5), x_dir=(-1, 0, 0), z_dir=(0, 0, -1))):
        with Locations((15.700980392, 1.686725095)):
            Rectangle(SKETCH_33_W, SKETCH_33_H)
        with Locations((15.700980392, 15.424712581)):
            Circle(SKETCH_33_R, mode=Mode.SUBTRACT)
        with Locations(Location((12.200980392, 15.384992379, 0), (0, 0, 180))):
            Circle(SKETCH_33_R, mode=Mode.SUBTRACT)
        with Locations(Location((19.200980392, 15.384992379, 0), (0, 0, 180))):
            Circle(SKETCH_33_R, mode=Mode.SUBTRACT)
        with Locations(Location((25.773264037, 17.574712581, 0), (0, 0, 180))):
            Circle(SKETCH_33_R_2, mode=Mode.SUBTRACT)
        with Locations(Location((5.628696747, 17.574712581, 0), (0, 0, 180))):
            Circle(SKETCH_33_R_2, mode=Mode.SUBTRACT)
        with BuildLine():
            Line((9.250980392, -10.825287419), (12.450980392, -10.825287419))
            Line((12.450980392, -10.825287419), (12.450980392, -14.084790003))
            Line((12.450980392, -14.084790003), (15.385380168, -14.084790003))
            ThreePointArc((15.385380168, -14.084790003), (15.700980392, -14.125287419), (16.016580616, -14.084790003))
            Line((16.016580616, -14.084790003), (18.950980392, -14.084790003))
            Line((18.950980392, -14.084790003), (18.950980392, -10.825287419))
            Line((18.950980392, -10.825287419), (22.150980392, -10.825287419))
            Line((22.150980392, -10.825287419), (22.150980392, 13.374712581))
            Line((22.150980392, 13.374712581), (9.250980392, 13.374712581))
            Line((9.250980392, 13.374712581), (9.250980392, -10.825287419))
        make_face(mode=Mode.SUBTRACT)
    extrude(amount=EXTRUDE_8_DEPTH)

    # 草图34 outside → 切除-拉伸15 (cut)
    with BuildSketch(Plane.XY.offset(13)):
        with Locations((-15.701, 1.687)):
            Rectangle(SKETCH_34_OUTSIDE_W, SKETCH_34_OUTSIDE_H)
        with Locations((-15.700980392, 2.766642636)):
            Rectangle(SKETCH_34_OUTSIDE_W_2, SKETCH_34_OUTSIDE_H_2, mode=Mode.SUBTRACT)
    extrude(amount=-CUT_EXTRUDE_15_DEPTH, mode=Mode.SUBTRACT)

    # 草图35 → 切除-拉伸16 (cut)
    with BuildSketch(Plane.XY.offset(13)):
        with Locations((-15.700980392, 1.798395824)):
            Rectangle(SKETCH_35_W, SKETCH_35_H)
    extrude(amount=-CUT_EXTRUDE_16_DEPTH, mode=Mode.SUBTRACT)

    # 草图37 → 凸台-拉伸9 (add)
    with BuildSketch(Plane(origin=(0, 20.692685664, 0), x_dir=(1, 0, 0), z_dir=(0, 1, 0))):
        with Locations(Location((-15.700980392, -6.5, 0), (0, 0, 270))):
            Circle(SKETCH_37_R)
    extrude(amount=EXTRUDE_9_DEPTH)

    # 草图39 → 切除-拉伸17 (cut)
    with BuildSketch(Plane(origin=(0, 0, -3.5), x_dir=(-1, 0, 0), z_dir=(0, 0, -1))):
        with Locations((15.655722224, 1.624936556)):
            Rectangle(SKETCH_39_W, SKETCH_39_H)
    extrude(amount=-CUT_EXTRUDE_17_DEPTH, mode=Mode.SUBTRACT)

    # 圆角7
    fillet_7_edges = [part.edges().sort_by_distance(p)[0] for p in [
        (-27.650980392, -17.319235473, -2),
        (-27.650980392, 20.692685664, -2),
        (-3.750980392, 20.692685664, -2),
        (-3.750980392, -17.319235473, -2),
    ]]
    fillet(fillet_7_edges, radius=FILLET_7_R)

    # 草图40 → 切除-拉伸18 (cut, two sides: drawn at the far end of the back side and taken through both)
    with BuildSketch(Plane(origin=(0, 25.692685664, 0), x_dir=(1, 0, 0), z_dir=(0, 1, 0)).offset(-CUT_EXTRUDE_18_DEPTH_BACK)):
        with Locations(Location((-15.700980392, -6.5, 0), (0, 0, 270))):
            Circle(SKETCH_40_R)
    extrude(amount=CUT_EXTRUDE_18_DEPTH + CUT_EXTRUDE_18_DEPTH_BACK, mode=Mode.SUBTRACT)

    # 草图42 → 凸台-拉伸10 (add)
    with BuildSketch(Plane.XY.offset(2)):
        with Locations((-15.66246504, -13.157954594)):
            Rectangle(SKETCH_42_W, SKETCH_42_H)
    extrude(amount=EXTRUDE_10_DEPTH)

    # 草图41 → 切除-拉伸19 (cut)
    with BuildSketch(Plane.XZ.offset(17.319235473)):
        with BuildLine():
            Line((-19.775980392, 6.5), (-18.406082759, 20.501521641))
            ThreePointArc((-18.406082759, 20.501521641), (-15.665794747, 23.749766381), (-13.011106202, 20.431197259))
            Line((-13.011106202, 20.431197259), (-11.625980392, 6.5))
            ThreePointArc((-11.625980392, 6.5), (-15.700980392, 2.425), (-19.775980392, 6.5))
        make_face()
    extrude(amount=-CUT_EXTRUDE_19_DEPTH, mode=Mode.SUBTRACT)

    # 草图43 → 切除-拉伸20 (cut)
    with BuildSketch(Plane.XZ.offset(12.825287419)):
        with Locations(Location((-15.700980392, 6.5, 0), (0, 0, 270))):
            Circle(SKETCH_43_R)
    extrude(amount=-CUT_EXTRUDE_20_DEPTH, mode=Mode.SUBTRACT)

    # 草图44 → 切除-拉伸21 (cut)
    with BuildSketch(Plane(origin=(0, 0, -0.5), x_dir=(-1, 0, 0), z_dir=(0, 0, -1))):
        with Locations((15.746169131, -12.123442458)):
            Rectangle(SKETCH_44_W, SKETCH_44_H)
    extrude(amount=-CUT_EXTRUDE_21_DEPTH, mode=Mode.SUBTRACT)

    # 草图46 → 凸台-拉伸11 (add)
    with BuildSketch(Plane.XZ.offset(12.825287419)):
        with Locations((-15.749811773, 7.506472688)):
            Rectangle(SKETCH_46_W, SKETCH_46_H)
    extrude(amount=EXTRUDE_11_DEPTH)

    # 草图48 → 凸台-拉伸12 (add)
    with BuildSketch(Plane.XZ.offset(11.825287419)):
        with Locations((-15.761363582, 8.5864607)):
            Rectangle(SKETCH_48_W, SKETCH_48_H)
    extrude(amount=EXTRUDE_12_DEPTH)

    # 圆角9
    # the kernel refuses this fillet: 11.5 mm, written as the material it takes off along each edge
    with BuildSketch(Plane(origin=(-22.24135787, -12.825287419, 2.012945375), x_dir=(0, -1.0, 1.3077435417698884e-12), z_dir=(1, 0, 0))) as fillet_9_piece_1:
        with BuildLine():
            CenterArc((11.5, -3.655071281), FILLET_9_R, 161.468118769, 18.531881231)
            Line((0, -3.655071281), (0, 0))
            Line((0, 0), (0.596310077, 0))
        make_face()
    extrude(amount=12.990377478, mode=Mode.SUBTRACT)

    # 圆角11
    # the kernel refuses this fillet: 2 mm, written as the material it takes off along each edge
    with BuildSketch(Plane(origin=(-9.250980392, -10.825287419, 7), x_dir=(0, 0, 1), z_dir=(-1, 0, 0))) as fillet_11_piece_1:
        with BuildLine():
            CenterArc((FILLET_11_R, -FILLET_11_R), FILLET_11_R, 90, 90)
            Line((0, -FILLET_11_R), (0, 0))
            Line((0, 0), (FILLET_11_R, 0))
        make_face()
    extrude(amount=12.9, mode=Mode.SUBTRACT)

    # 圆角12
    fillet_12_edges = [part.edges().sort_by_distance(p)[0] for p in [
        (-7.72802616, -17.319235473, 6.25),
        (-23.673934624, -17.319235473, 6.25),
        (-7.72802616, 20.692685664, 6.25),
        (-23.673934624, 20.692685664, 6.25),
    ]]
    fillet(fillet_12_edges, radius=FILLET_12_R)

    # 草图49 → 切除-拉伸22 (cut, through all)
    with BuildSketch(Plane(origin=(0, 0, -3.5), x_dir=(-1, 0, 0), z_dir=(0, 0, -1))):
        with Locations(Location((5.628696747, -14.974790003, 0), (0, 0, 90))):
            Circle(SKETCH_49_R)
        with Locations(Location((25.773264037, -14.974790003, 0), (0, 0, 90))):
            Circle(SKETCH_49_R_2)
    extrude(amount=-CUT_EXTRUDE_22_DEPTH, mode=Mode.SUBTRACT)


solid = part.part
